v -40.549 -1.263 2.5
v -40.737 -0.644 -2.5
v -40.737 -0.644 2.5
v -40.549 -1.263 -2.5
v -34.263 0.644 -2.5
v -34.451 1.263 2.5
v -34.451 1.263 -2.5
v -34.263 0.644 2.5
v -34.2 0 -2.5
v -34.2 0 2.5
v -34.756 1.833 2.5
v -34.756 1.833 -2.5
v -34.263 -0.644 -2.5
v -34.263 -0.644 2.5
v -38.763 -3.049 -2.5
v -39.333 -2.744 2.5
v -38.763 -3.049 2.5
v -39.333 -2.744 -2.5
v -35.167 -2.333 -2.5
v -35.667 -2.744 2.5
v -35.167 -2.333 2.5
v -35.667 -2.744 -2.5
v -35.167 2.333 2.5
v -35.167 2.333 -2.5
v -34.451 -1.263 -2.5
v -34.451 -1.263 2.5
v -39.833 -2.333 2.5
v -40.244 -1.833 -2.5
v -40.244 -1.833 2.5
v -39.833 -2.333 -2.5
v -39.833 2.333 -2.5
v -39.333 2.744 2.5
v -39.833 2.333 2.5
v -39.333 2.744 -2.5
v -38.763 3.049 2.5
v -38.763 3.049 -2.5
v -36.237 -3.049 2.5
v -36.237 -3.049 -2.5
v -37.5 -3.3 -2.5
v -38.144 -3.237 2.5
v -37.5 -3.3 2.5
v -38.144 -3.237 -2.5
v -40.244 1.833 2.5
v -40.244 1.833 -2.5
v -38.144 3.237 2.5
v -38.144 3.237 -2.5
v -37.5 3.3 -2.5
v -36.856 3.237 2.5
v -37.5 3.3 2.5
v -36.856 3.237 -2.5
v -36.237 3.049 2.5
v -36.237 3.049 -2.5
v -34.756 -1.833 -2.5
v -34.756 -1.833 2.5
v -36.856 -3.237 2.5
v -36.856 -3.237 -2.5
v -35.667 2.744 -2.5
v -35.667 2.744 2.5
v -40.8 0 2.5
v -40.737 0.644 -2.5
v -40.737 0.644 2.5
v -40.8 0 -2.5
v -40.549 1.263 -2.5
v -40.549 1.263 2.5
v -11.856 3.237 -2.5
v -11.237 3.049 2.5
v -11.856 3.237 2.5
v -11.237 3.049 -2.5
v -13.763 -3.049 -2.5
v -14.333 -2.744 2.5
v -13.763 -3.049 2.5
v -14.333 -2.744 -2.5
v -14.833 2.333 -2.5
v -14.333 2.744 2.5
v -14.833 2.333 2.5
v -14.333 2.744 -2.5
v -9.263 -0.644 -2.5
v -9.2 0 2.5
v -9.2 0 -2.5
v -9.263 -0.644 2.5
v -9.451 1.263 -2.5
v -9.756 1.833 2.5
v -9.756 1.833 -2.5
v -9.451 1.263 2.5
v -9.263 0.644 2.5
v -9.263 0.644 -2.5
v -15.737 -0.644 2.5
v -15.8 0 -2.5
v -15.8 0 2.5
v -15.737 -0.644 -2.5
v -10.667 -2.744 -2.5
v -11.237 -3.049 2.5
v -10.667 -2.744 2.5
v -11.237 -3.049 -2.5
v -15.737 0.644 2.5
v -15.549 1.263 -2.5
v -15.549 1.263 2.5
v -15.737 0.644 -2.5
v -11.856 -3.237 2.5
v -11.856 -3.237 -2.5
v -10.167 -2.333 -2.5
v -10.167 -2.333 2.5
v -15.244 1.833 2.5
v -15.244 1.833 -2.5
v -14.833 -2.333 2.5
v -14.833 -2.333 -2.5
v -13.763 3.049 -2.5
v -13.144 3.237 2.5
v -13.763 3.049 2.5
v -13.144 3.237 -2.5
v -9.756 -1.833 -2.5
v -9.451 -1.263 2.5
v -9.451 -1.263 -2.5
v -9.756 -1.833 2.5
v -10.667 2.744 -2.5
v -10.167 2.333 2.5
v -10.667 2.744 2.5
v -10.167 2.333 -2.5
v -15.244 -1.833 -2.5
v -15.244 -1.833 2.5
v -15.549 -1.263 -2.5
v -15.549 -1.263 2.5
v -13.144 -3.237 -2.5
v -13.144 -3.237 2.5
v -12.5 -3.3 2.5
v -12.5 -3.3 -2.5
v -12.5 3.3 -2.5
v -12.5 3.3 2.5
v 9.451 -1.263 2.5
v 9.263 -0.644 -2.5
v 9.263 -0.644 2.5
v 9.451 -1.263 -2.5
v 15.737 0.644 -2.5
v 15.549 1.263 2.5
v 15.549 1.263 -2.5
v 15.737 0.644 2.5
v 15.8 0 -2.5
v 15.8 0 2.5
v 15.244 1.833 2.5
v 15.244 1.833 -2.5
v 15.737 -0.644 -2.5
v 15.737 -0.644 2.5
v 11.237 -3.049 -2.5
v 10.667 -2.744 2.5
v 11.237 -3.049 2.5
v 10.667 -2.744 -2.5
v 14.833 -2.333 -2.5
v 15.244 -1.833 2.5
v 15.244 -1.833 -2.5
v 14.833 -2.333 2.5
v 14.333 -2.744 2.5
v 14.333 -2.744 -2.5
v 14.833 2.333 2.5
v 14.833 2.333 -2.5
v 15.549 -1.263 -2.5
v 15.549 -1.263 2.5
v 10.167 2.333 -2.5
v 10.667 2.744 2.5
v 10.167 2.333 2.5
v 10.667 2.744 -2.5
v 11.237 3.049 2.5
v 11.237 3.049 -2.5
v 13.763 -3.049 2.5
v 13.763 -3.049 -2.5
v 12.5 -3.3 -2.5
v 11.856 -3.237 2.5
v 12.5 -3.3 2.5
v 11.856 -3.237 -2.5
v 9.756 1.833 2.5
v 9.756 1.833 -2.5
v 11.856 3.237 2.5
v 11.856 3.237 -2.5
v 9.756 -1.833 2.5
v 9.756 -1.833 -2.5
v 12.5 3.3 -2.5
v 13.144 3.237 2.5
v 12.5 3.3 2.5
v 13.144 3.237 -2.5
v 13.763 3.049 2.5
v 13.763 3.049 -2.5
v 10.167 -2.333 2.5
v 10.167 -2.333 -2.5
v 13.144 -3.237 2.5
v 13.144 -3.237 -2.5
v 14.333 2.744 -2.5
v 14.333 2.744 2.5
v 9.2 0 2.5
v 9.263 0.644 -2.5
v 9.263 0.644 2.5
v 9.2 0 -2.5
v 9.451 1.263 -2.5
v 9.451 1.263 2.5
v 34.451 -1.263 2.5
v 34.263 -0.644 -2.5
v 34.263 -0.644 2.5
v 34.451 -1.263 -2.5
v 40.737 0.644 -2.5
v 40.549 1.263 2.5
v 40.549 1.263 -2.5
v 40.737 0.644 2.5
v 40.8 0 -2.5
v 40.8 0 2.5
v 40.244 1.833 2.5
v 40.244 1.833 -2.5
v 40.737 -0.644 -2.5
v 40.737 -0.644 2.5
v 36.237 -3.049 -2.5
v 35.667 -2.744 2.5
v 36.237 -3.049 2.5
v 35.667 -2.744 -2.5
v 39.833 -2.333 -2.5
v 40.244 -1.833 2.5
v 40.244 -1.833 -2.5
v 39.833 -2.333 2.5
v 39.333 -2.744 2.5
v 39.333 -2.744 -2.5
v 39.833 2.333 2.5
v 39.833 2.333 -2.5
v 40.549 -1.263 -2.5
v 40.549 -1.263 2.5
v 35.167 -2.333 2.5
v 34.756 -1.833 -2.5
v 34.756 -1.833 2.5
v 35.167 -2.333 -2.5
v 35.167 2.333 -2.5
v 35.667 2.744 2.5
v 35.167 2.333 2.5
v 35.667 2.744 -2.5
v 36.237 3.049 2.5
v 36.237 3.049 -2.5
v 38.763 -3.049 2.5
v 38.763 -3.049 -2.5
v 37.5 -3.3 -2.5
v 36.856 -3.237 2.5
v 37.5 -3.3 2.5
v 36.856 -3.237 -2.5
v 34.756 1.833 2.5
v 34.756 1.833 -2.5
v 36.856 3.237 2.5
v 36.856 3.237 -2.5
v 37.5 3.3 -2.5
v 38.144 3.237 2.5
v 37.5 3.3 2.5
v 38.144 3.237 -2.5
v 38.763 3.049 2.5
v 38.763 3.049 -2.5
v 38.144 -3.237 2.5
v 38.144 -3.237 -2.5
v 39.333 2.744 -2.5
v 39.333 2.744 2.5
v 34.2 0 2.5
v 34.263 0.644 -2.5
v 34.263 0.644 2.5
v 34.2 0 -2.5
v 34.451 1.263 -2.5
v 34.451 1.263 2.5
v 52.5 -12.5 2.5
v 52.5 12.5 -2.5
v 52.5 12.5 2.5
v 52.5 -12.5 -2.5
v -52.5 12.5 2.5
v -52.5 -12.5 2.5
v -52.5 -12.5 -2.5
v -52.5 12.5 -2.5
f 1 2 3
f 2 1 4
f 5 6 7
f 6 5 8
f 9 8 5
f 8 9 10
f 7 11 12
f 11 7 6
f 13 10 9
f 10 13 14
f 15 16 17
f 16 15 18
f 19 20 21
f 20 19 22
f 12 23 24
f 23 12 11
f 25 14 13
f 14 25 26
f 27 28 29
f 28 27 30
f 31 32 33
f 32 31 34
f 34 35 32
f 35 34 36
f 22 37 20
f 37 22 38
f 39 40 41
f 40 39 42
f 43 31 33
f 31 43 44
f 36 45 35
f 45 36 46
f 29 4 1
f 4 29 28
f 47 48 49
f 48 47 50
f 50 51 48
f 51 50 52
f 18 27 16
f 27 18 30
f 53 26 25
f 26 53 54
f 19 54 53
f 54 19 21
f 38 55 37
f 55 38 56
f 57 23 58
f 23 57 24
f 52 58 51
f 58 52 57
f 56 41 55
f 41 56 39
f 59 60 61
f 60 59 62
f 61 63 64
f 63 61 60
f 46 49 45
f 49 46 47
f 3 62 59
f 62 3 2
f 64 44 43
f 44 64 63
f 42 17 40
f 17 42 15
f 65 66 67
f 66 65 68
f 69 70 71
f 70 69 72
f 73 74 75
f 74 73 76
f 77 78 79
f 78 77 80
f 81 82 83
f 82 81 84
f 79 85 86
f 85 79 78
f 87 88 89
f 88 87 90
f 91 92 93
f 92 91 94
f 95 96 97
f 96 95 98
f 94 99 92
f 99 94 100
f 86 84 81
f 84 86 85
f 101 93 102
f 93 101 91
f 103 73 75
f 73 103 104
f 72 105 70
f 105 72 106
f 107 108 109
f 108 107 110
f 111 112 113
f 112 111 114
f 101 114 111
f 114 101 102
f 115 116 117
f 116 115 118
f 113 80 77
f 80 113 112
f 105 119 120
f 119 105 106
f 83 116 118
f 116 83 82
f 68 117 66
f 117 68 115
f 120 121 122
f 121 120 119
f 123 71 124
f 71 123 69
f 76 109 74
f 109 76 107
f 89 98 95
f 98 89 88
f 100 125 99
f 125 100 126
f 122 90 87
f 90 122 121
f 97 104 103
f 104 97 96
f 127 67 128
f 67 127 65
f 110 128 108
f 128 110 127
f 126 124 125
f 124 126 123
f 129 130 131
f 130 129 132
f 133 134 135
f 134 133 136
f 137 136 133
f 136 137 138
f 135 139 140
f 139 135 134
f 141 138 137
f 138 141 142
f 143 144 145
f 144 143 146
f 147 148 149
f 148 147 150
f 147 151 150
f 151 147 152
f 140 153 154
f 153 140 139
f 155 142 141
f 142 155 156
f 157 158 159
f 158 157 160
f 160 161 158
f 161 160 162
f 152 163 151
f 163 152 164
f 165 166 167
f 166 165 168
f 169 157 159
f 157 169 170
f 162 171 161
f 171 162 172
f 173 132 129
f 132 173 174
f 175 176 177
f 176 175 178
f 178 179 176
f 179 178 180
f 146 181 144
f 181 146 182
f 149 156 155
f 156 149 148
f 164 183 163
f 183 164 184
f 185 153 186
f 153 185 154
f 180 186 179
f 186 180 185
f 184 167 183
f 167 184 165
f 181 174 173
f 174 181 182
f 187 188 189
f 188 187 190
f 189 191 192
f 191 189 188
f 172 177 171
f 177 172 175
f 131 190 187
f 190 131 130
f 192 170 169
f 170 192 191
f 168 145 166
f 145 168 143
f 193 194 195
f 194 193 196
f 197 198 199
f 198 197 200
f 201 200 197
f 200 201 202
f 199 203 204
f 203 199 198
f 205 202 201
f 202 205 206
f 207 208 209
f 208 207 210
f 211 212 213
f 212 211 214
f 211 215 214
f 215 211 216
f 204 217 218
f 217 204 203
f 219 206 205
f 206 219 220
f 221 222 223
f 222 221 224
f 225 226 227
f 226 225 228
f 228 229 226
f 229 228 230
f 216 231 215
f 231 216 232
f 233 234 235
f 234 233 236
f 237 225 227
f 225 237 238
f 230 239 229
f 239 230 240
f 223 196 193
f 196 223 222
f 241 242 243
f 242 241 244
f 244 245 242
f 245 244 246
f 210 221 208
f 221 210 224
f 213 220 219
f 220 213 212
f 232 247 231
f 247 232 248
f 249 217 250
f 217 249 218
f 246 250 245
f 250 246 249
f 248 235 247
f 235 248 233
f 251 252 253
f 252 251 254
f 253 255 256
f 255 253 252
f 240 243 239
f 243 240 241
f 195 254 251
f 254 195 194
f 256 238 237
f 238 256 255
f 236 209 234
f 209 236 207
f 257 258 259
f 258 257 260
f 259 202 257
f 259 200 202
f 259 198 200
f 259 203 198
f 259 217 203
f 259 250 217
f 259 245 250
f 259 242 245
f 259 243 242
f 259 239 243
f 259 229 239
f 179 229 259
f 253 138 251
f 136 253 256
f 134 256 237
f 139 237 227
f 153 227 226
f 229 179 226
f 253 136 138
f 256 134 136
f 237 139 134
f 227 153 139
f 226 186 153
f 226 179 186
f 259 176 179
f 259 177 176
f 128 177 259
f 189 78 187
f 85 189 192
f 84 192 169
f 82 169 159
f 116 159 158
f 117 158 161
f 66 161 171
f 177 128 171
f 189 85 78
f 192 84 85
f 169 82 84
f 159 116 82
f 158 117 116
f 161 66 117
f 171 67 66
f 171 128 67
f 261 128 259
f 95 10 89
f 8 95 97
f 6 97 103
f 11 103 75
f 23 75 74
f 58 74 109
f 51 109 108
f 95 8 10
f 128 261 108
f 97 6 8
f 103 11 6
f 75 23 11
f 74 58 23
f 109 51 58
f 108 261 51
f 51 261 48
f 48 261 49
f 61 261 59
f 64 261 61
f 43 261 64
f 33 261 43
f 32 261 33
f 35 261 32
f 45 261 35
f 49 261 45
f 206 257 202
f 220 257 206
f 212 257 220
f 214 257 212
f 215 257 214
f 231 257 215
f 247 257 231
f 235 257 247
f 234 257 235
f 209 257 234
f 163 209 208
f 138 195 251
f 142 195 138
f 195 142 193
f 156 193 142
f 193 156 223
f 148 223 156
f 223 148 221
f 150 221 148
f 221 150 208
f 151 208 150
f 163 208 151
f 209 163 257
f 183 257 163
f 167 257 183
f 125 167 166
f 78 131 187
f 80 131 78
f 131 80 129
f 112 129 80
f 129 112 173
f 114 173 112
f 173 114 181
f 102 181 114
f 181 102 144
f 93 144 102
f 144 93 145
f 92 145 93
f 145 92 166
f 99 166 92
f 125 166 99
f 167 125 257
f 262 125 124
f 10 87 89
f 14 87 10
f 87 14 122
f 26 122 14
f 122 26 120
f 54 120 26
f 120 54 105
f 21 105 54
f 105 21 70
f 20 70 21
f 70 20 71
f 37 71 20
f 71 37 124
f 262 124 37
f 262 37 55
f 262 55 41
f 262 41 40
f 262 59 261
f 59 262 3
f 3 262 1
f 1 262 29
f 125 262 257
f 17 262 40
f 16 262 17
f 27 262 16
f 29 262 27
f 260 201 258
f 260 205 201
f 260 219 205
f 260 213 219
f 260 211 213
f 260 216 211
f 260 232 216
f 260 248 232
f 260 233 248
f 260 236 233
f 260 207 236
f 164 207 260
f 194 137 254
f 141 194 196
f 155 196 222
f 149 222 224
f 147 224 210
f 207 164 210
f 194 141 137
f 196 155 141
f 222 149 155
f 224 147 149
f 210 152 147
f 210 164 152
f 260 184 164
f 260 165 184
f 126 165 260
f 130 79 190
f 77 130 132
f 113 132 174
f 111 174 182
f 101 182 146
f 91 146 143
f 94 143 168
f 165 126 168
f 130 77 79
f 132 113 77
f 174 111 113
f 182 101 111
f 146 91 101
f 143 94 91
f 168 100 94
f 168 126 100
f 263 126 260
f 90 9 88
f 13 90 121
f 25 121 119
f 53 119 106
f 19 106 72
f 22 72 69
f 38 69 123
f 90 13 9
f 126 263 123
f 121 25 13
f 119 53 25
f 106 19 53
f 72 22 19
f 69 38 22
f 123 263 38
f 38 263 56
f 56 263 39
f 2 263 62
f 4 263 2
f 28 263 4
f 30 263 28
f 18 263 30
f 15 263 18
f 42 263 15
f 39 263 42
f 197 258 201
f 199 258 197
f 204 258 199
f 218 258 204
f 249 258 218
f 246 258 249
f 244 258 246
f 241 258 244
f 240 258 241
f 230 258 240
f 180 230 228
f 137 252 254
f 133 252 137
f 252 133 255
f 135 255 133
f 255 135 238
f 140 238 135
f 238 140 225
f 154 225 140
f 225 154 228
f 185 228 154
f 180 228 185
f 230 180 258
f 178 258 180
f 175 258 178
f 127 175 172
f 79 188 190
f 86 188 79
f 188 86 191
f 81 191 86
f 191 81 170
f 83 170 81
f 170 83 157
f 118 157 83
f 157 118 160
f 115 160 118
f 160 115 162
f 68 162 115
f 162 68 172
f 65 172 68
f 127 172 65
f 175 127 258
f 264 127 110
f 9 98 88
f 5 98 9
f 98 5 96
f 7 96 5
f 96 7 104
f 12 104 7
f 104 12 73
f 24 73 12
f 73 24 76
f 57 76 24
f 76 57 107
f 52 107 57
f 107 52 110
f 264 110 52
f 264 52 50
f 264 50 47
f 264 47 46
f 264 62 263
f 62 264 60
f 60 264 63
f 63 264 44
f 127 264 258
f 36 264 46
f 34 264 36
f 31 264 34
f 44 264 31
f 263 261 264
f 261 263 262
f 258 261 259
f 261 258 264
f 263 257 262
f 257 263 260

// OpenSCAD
$fn = 32;

// ----------------------------------------------------------------------
// Hole bar, 4 x Ø6.6
// row layout, 15 mm edge offset
// ----------------------------------------------------------------------

// --- parameters (mm) ---
bar_w = 25;    // bar width (Y)
bar_t = 5;     // bar thickness (Z)
holes = 4;     // holes per row
hole_d = 6.6;  // hole diameter
edge = 15;     // offset from the bar end to the first hole
pitch = 25;    // pitch between neighbouring holes

// --- derived feature positions (mm) ---
span = (holes - 1) * pitch;   // = 75   distance between the end holes
bar_l = span + 2 * edge;      // = 105   overall bar length
start_x = -bar_l / 2 + edge;  // = -37.5   X of the first hole
feature_centers = [
  [start_x + 0 * pitch, 0],
  [start_x + 1 * pitch, 0],
  [start_x + 2 * pitch, 0],
  [start_x + 3 * pitch, 0]
];   // hole centres of the first row

// bar with one row of holes, drilled from feature_centers
difference() {
  translate([-bar_l / 2, -bar_w / 2, -bar_t / 2]) cube([bar_l, bar_w, bar_t]);
  for (centre = feature_centers)
    translate([centre[0], centre[1], 0])
      cylinder(d = hole_d, h = bar_t + 2, center = true);
}
